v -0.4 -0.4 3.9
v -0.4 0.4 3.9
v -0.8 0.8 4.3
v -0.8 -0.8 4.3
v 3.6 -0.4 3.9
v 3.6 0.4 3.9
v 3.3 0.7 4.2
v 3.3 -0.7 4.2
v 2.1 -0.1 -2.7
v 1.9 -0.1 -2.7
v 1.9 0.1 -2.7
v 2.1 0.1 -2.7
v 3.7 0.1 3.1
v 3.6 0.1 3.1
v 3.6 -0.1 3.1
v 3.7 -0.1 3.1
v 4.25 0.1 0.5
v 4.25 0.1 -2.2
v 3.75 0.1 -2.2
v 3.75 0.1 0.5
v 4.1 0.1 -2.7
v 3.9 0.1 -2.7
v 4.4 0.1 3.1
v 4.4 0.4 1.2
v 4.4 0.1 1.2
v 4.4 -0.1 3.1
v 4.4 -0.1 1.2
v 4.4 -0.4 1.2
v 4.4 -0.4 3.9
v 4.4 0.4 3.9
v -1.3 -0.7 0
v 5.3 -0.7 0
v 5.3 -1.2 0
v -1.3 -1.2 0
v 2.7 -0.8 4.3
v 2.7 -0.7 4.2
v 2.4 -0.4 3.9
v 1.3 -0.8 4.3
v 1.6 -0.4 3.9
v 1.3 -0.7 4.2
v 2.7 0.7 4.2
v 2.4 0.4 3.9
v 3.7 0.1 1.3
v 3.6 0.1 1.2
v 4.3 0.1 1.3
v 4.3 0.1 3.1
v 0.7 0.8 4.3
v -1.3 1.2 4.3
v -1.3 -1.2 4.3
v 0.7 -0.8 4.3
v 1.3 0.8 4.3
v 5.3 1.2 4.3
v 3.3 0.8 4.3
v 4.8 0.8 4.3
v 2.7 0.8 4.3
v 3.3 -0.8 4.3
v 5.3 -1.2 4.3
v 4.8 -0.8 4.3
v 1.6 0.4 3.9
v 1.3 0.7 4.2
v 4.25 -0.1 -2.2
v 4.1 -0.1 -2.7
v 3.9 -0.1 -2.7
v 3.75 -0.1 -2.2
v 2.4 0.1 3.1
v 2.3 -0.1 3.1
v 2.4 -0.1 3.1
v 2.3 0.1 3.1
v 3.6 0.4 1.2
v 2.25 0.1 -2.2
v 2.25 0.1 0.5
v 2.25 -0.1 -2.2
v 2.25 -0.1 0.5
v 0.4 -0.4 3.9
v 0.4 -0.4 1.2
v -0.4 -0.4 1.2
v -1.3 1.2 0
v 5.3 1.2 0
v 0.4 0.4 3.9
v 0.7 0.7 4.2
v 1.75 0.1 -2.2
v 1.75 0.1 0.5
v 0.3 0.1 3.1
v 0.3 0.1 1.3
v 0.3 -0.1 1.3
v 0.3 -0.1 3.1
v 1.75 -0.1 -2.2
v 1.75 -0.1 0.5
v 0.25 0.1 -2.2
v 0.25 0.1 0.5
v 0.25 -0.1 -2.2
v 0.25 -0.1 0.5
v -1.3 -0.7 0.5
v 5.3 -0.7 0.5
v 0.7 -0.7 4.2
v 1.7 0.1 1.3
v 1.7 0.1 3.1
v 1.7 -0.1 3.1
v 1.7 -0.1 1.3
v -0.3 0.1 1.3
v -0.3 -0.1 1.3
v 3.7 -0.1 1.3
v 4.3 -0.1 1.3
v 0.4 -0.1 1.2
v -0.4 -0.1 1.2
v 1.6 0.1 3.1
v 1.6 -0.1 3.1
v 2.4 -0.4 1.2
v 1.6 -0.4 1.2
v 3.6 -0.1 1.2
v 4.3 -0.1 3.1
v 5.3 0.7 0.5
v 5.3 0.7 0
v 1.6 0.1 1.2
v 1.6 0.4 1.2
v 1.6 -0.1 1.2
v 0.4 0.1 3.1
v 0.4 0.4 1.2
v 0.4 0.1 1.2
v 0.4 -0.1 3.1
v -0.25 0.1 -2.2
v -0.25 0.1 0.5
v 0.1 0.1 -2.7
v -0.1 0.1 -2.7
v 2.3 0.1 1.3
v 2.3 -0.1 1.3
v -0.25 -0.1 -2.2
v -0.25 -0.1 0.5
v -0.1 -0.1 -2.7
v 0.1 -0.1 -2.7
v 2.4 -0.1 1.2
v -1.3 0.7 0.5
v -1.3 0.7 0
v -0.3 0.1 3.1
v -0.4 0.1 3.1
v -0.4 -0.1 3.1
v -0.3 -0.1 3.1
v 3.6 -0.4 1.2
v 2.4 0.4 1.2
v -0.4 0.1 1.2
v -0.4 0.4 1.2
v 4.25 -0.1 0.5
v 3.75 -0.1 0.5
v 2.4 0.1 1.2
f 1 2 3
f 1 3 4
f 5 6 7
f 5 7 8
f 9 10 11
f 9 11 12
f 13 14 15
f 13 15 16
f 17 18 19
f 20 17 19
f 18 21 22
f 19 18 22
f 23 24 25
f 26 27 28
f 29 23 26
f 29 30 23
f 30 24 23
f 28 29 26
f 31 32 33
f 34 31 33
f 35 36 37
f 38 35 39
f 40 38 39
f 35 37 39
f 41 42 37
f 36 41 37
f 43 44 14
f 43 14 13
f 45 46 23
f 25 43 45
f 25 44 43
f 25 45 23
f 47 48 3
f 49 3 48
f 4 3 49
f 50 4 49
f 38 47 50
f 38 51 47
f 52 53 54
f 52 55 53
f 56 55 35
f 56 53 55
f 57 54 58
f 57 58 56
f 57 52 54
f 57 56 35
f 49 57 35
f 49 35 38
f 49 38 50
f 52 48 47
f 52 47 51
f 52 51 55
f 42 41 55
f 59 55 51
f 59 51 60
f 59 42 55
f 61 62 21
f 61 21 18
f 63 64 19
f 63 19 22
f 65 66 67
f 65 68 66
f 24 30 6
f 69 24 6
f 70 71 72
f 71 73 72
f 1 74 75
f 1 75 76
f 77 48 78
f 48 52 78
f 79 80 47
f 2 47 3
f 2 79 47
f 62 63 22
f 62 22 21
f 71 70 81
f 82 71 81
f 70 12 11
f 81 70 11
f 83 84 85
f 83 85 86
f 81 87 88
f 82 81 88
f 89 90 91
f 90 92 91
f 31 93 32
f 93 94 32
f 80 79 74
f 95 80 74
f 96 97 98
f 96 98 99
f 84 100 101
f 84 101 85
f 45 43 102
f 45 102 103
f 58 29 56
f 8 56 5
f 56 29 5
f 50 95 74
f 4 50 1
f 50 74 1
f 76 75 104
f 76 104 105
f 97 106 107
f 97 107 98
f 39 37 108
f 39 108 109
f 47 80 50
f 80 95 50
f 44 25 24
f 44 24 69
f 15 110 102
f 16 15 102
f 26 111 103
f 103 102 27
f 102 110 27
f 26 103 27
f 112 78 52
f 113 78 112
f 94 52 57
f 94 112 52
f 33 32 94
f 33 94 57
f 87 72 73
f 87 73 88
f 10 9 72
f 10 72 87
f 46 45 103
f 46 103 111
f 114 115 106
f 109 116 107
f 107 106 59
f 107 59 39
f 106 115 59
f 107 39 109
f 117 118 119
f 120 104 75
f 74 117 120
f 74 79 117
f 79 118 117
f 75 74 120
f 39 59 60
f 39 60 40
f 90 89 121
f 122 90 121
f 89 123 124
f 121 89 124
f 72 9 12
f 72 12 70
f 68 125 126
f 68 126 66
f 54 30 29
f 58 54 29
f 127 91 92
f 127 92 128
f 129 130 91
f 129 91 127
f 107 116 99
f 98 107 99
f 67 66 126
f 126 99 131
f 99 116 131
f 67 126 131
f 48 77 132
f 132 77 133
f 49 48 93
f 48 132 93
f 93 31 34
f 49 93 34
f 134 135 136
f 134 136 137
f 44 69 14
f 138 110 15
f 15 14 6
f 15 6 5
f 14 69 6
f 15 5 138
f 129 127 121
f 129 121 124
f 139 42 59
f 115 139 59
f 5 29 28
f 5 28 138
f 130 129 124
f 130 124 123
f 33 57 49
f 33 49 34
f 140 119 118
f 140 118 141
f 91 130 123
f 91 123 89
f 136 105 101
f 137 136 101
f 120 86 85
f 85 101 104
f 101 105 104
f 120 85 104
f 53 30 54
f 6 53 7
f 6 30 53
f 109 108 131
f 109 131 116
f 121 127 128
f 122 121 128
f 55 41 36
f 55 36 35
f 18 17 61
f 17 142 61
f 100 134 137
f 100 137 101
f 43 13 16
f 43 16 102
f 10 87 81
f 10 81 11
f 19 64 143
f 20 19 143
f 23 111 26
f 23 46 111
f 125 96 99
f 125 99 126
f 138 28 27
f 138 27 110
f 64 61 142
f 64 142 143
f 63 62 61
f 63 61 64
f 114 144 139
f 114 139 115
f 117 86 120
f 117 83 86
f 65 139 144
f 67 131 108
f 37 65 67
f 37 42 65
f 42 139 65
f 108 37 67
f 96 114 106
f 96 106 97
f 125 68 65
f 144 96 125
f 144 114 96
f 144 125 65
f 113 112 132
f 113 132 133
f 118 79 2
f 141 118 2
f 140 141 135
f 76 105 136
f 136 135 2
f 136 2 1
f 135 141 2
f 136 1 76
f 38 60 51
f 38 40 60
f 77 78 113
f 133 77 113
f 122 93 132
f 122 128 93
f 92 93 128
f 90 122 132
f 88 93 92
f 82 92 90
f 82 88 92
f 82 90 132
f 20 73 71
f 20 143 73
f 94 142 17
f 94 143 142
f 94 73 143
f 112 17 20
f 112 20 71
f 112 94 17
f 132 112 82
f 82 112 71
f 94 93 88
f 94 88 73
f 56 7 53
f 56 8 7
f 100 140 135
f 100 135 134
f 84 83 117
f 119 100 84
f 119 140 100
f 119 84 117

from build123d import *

# Parameters (mm, degrees)
SKETCH1_W           = 2.4
SKETCH1_H           = 4.3
BOSS_EXTRUDE1_DEPTH = 1.3
SKETCH_1_W          = 0.5
SKETCH_1_H          = 1.4
CUT_EXTRUDE_1_DEPTH = 6.166236541
SKETCH2_W           = 0.8
SKETCH2_H           = 0.8
CUT_EXTRUDE1_DEPTH  = 3.1
CHAMFER_1_SIZE      = 0.4
BOSS_EXTRUDE2_DEPTH = 0.1
LPATTERN1_COUNT     = 3
LPATTERN1_PITCH     = 2


with BuildPart() as part:
    # Sketch1 → Boss-Extrude1 (new, symmetric)
    with BuildSketch(Plane(origin=(0, 0, 0), x_dir=(0, -1, 0), z_dir=(1, 0, 0))):
        with Locations((0, -2.15)):
            Rectangle(SKETCH1_W, SKETCH1_H)
    extrude(amount=BOSS_EXTRUDE1_DEPTH, both=True)

    # Эскиз1 → Вырез-Вытянуть1 (cut, through all)
    with BuildSketch(Plane(origin=(1.3, 0, 0), x_dir=(0, 0, -1), z_dir=(1, 0, 0))):
        with Locations((-0.25, 0)):
            Rectangle(SKETCH_1_W, SKETCH_1_H)
    extrude(amount=-CUT_EXTRUDE_1_DEPTH, mode=Mode.SUBTRACT)

    # Sketch2 → Cut-Extrude1 (cut)
    with BuildSketch(Plane(origin=(0, 0, 4.3), x_dir=(-1, 0, 0), z_dir=(0, 0, 1))):
        Rectangle(SKETCH2_W, SKETCH2_H)
    extrude(amount=-CUT_EXTRUDE1_DEPTH, mode=Mode.SUBTRACT)

    # Фаска1
    chamfer_1_edges = [part.edges().sort_by_distance(p)[0] for p in [
        (-0.4, 0, 4.3),
        (0, -0.4, 4.3),
        (0.4, 0, 4.3),
        (0, 0.4, 4.3),
    ]]
    chamfer(chamfer_1_edges, length=CHAMFER_1_SIZE)

    # Sketch3 → Boss-Extrude2 (add, symmetric)
    with BuildSketch(Plane(origin=(0, 0, 0), x_dir=(1, 0, 0), z_dir=(0, 1, 0))):
        Polygon((-0.25, 0), (-0.25, 2.2), (-0.1, 2.7), (0.1, 2.7), (0.25, 2.2), (0.25, 0), (0.25, -0.5), (-0.25, -0.5), align=None)
        Polygon((0.4, -1.2), (-0.4, -1.2), (-0.4, -3.1), (-0.3, -3.1), (-0.3, -1.3), (0.3, -1.3), (0.3, -3.1), (0.4, -3.1), align=None)
    extrude(amount=BOSS_EXTRUDE2_DEPTH, both=True)


with BuildPart() as lpattern1_1:
    # LPattern1: pattern copy
    add(part.part.moved(Location(Vector(1, 0, 0) * (1 * LPATTERN1_PITCH))))


with BuildPart() as lpattern1_2:
    # LPattern1: pattern copy
    add(part.part.moved(Location(Vector(1, 0, 0) * (2 * LPATTERN1_PITCH))))


with BuildPart() as lpattern1_1_1:
    add(lpattern1_1.part)

    # Combine 1: union part, LPattern1_2
    add(part.part)
    add(lpattern1_2.part)


solid = lpattern1_1_1.part
